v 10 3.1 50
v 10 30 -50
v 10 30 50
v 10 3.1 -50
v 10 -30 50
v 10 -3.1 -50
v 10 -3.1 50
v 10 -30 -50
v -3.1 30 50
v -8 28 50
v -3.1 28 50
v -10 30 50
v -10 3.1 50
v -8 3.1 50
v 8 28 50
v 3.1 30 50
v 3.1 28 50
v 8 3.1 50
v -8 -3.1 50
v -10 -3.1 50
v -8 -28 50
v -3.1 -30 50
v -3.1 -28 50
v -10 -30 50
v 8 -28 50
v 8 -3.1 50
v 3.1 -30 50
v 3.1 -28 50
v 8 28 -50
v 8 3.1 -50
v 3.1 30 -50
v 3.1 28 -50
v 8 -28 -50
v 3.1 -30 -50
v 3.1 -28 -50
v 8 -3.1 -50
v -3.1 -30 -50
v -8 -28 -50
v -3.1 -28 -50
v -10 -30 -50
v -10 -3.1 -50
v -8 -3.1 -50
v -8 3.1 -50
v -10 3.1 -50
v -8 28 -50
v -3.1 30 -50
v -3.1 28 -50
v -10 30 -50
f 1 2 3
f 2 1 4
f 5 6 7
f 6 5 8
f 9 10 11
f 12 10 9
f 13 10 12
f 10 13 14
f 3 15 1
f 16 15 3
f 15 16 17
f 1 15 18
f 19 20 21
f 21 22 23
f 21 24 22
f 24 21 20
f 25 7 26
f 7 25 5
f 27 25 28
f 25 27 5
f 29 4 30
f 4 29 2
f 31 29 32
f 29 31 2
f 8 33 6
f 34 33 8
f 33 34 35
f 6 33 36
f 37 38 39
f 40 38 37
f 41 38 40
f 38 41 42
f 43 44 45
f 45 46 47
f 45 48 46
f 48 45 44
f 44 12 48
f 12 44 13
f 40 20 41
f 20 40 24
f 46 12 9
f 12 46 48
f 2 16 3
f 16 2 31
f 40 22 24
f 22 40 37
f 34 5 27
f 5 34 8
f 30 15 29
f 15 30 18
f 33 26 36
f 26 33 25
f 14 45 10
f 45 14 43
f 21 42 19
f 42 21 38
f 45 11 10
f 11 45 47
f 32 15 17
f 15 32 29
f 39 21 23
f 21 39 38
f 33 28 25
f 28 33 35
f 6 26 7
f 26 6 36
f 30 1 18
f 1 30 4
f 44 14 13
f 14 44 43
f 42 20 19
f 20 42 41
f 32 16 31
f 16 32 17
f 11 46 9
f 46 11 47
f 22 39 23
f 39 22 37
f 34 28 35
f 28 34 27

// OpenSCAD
// 20x60 aluminium extrusion profile, 100mm long (Z axis)
// One connected solid, with visible T-slots and internal cavities.

$fn = 96;

module extrusion_20x60(len=100, w=20, h=60) {

    // Typical-ish 20-series slot geometry (approximate)
    wall        = 2.0;   // outer wall thickness
    slot_open   = 6.2;   // opening at surface
    slot_neck   = 3.2;   // narrow neck just inside opening
    slot_depth  = 10.0;  // total depth from surface to back of slot cavity
    neck_depth  = 2.2;   // depth of the narrow neck region
    slot_cavity = 10.2;  // width of the inner cavity behind the neck

    // Internal void (kept smaller than outer to preserve walls)
    inner_w = w - 2*wall;
    inner_h = h - 2*wall;

    // Center bore (common for 20-series)
    bore_r = 2.6;

    eps = 0.2;

    // 2D profile for a single T-slot cut from +X face inward
    module tslot2d_x() {
        // Coordinates in XY plane; +X is outward face.
        // Build as union of rectangles to form opening + neck + cavity.
        union() {
            // Opening at surface
            translate([ w/2 - slot_depth/2, 0 ])
                square([slot_depth, slot_open], center=true);

            // Neck near surface (slightly shallower)
            translate([ w/2 - neck_depth/2, 0 ])
                square([neck_depth, slot_neck], center=true);

            // Inner cavity behind neck
            cavity_depth = max(0.1, slot_depth - neck_depth);
            translate([ w/2 - neck_depth - cavity_depth/2, 0 ])
                square([cavity_depth, slot_cavity], center=true);
        }
    }

    // 2D profile for a single T-slot cut from +Y face inward
    module tslot2d_y() {
        union() {
            translate([ 0, h/2 - slot_depth/2 ])
                square([slot_open, slot_depth], center=true);

            translate([ 0, h/2 - neck_depth/2 ])
                square([slot_neck, neck_depth], center=true);

            cavity_depth = max(0.1, slot_depth - neck_depth);
            translate([ 0, h/2 - neck_depth - cavity_depth/2 ])
                square([slot_cavity, cavity_depth], center=true);
        }
    }

    difference() {
        // Outer body
        cube([w, h, len], center=true);

        // Main internal cavity (keeps outer walls)
        cube([inner_w, inner_h, len + eps], center=true);

        // Four T-slots (extruded along Z)
        linear_extrude(height=len + eps, center=true) tslot2d_x();
        linear_extrude(height=len + eps, center=true) mirror([1,0,0]) tslot2d_x();

        linear_extrude(height=len + eps, center=true) tslot2d_y();
        linear_extrude(height=len + eps, center=true) mirror([0,1,0]) tslot2d_y();

        // Center bore
        cylinder(r=bore_r, h=len + eps, center=true);
    }
}

extrusion_20x60(len=100, w=20, h=60);
